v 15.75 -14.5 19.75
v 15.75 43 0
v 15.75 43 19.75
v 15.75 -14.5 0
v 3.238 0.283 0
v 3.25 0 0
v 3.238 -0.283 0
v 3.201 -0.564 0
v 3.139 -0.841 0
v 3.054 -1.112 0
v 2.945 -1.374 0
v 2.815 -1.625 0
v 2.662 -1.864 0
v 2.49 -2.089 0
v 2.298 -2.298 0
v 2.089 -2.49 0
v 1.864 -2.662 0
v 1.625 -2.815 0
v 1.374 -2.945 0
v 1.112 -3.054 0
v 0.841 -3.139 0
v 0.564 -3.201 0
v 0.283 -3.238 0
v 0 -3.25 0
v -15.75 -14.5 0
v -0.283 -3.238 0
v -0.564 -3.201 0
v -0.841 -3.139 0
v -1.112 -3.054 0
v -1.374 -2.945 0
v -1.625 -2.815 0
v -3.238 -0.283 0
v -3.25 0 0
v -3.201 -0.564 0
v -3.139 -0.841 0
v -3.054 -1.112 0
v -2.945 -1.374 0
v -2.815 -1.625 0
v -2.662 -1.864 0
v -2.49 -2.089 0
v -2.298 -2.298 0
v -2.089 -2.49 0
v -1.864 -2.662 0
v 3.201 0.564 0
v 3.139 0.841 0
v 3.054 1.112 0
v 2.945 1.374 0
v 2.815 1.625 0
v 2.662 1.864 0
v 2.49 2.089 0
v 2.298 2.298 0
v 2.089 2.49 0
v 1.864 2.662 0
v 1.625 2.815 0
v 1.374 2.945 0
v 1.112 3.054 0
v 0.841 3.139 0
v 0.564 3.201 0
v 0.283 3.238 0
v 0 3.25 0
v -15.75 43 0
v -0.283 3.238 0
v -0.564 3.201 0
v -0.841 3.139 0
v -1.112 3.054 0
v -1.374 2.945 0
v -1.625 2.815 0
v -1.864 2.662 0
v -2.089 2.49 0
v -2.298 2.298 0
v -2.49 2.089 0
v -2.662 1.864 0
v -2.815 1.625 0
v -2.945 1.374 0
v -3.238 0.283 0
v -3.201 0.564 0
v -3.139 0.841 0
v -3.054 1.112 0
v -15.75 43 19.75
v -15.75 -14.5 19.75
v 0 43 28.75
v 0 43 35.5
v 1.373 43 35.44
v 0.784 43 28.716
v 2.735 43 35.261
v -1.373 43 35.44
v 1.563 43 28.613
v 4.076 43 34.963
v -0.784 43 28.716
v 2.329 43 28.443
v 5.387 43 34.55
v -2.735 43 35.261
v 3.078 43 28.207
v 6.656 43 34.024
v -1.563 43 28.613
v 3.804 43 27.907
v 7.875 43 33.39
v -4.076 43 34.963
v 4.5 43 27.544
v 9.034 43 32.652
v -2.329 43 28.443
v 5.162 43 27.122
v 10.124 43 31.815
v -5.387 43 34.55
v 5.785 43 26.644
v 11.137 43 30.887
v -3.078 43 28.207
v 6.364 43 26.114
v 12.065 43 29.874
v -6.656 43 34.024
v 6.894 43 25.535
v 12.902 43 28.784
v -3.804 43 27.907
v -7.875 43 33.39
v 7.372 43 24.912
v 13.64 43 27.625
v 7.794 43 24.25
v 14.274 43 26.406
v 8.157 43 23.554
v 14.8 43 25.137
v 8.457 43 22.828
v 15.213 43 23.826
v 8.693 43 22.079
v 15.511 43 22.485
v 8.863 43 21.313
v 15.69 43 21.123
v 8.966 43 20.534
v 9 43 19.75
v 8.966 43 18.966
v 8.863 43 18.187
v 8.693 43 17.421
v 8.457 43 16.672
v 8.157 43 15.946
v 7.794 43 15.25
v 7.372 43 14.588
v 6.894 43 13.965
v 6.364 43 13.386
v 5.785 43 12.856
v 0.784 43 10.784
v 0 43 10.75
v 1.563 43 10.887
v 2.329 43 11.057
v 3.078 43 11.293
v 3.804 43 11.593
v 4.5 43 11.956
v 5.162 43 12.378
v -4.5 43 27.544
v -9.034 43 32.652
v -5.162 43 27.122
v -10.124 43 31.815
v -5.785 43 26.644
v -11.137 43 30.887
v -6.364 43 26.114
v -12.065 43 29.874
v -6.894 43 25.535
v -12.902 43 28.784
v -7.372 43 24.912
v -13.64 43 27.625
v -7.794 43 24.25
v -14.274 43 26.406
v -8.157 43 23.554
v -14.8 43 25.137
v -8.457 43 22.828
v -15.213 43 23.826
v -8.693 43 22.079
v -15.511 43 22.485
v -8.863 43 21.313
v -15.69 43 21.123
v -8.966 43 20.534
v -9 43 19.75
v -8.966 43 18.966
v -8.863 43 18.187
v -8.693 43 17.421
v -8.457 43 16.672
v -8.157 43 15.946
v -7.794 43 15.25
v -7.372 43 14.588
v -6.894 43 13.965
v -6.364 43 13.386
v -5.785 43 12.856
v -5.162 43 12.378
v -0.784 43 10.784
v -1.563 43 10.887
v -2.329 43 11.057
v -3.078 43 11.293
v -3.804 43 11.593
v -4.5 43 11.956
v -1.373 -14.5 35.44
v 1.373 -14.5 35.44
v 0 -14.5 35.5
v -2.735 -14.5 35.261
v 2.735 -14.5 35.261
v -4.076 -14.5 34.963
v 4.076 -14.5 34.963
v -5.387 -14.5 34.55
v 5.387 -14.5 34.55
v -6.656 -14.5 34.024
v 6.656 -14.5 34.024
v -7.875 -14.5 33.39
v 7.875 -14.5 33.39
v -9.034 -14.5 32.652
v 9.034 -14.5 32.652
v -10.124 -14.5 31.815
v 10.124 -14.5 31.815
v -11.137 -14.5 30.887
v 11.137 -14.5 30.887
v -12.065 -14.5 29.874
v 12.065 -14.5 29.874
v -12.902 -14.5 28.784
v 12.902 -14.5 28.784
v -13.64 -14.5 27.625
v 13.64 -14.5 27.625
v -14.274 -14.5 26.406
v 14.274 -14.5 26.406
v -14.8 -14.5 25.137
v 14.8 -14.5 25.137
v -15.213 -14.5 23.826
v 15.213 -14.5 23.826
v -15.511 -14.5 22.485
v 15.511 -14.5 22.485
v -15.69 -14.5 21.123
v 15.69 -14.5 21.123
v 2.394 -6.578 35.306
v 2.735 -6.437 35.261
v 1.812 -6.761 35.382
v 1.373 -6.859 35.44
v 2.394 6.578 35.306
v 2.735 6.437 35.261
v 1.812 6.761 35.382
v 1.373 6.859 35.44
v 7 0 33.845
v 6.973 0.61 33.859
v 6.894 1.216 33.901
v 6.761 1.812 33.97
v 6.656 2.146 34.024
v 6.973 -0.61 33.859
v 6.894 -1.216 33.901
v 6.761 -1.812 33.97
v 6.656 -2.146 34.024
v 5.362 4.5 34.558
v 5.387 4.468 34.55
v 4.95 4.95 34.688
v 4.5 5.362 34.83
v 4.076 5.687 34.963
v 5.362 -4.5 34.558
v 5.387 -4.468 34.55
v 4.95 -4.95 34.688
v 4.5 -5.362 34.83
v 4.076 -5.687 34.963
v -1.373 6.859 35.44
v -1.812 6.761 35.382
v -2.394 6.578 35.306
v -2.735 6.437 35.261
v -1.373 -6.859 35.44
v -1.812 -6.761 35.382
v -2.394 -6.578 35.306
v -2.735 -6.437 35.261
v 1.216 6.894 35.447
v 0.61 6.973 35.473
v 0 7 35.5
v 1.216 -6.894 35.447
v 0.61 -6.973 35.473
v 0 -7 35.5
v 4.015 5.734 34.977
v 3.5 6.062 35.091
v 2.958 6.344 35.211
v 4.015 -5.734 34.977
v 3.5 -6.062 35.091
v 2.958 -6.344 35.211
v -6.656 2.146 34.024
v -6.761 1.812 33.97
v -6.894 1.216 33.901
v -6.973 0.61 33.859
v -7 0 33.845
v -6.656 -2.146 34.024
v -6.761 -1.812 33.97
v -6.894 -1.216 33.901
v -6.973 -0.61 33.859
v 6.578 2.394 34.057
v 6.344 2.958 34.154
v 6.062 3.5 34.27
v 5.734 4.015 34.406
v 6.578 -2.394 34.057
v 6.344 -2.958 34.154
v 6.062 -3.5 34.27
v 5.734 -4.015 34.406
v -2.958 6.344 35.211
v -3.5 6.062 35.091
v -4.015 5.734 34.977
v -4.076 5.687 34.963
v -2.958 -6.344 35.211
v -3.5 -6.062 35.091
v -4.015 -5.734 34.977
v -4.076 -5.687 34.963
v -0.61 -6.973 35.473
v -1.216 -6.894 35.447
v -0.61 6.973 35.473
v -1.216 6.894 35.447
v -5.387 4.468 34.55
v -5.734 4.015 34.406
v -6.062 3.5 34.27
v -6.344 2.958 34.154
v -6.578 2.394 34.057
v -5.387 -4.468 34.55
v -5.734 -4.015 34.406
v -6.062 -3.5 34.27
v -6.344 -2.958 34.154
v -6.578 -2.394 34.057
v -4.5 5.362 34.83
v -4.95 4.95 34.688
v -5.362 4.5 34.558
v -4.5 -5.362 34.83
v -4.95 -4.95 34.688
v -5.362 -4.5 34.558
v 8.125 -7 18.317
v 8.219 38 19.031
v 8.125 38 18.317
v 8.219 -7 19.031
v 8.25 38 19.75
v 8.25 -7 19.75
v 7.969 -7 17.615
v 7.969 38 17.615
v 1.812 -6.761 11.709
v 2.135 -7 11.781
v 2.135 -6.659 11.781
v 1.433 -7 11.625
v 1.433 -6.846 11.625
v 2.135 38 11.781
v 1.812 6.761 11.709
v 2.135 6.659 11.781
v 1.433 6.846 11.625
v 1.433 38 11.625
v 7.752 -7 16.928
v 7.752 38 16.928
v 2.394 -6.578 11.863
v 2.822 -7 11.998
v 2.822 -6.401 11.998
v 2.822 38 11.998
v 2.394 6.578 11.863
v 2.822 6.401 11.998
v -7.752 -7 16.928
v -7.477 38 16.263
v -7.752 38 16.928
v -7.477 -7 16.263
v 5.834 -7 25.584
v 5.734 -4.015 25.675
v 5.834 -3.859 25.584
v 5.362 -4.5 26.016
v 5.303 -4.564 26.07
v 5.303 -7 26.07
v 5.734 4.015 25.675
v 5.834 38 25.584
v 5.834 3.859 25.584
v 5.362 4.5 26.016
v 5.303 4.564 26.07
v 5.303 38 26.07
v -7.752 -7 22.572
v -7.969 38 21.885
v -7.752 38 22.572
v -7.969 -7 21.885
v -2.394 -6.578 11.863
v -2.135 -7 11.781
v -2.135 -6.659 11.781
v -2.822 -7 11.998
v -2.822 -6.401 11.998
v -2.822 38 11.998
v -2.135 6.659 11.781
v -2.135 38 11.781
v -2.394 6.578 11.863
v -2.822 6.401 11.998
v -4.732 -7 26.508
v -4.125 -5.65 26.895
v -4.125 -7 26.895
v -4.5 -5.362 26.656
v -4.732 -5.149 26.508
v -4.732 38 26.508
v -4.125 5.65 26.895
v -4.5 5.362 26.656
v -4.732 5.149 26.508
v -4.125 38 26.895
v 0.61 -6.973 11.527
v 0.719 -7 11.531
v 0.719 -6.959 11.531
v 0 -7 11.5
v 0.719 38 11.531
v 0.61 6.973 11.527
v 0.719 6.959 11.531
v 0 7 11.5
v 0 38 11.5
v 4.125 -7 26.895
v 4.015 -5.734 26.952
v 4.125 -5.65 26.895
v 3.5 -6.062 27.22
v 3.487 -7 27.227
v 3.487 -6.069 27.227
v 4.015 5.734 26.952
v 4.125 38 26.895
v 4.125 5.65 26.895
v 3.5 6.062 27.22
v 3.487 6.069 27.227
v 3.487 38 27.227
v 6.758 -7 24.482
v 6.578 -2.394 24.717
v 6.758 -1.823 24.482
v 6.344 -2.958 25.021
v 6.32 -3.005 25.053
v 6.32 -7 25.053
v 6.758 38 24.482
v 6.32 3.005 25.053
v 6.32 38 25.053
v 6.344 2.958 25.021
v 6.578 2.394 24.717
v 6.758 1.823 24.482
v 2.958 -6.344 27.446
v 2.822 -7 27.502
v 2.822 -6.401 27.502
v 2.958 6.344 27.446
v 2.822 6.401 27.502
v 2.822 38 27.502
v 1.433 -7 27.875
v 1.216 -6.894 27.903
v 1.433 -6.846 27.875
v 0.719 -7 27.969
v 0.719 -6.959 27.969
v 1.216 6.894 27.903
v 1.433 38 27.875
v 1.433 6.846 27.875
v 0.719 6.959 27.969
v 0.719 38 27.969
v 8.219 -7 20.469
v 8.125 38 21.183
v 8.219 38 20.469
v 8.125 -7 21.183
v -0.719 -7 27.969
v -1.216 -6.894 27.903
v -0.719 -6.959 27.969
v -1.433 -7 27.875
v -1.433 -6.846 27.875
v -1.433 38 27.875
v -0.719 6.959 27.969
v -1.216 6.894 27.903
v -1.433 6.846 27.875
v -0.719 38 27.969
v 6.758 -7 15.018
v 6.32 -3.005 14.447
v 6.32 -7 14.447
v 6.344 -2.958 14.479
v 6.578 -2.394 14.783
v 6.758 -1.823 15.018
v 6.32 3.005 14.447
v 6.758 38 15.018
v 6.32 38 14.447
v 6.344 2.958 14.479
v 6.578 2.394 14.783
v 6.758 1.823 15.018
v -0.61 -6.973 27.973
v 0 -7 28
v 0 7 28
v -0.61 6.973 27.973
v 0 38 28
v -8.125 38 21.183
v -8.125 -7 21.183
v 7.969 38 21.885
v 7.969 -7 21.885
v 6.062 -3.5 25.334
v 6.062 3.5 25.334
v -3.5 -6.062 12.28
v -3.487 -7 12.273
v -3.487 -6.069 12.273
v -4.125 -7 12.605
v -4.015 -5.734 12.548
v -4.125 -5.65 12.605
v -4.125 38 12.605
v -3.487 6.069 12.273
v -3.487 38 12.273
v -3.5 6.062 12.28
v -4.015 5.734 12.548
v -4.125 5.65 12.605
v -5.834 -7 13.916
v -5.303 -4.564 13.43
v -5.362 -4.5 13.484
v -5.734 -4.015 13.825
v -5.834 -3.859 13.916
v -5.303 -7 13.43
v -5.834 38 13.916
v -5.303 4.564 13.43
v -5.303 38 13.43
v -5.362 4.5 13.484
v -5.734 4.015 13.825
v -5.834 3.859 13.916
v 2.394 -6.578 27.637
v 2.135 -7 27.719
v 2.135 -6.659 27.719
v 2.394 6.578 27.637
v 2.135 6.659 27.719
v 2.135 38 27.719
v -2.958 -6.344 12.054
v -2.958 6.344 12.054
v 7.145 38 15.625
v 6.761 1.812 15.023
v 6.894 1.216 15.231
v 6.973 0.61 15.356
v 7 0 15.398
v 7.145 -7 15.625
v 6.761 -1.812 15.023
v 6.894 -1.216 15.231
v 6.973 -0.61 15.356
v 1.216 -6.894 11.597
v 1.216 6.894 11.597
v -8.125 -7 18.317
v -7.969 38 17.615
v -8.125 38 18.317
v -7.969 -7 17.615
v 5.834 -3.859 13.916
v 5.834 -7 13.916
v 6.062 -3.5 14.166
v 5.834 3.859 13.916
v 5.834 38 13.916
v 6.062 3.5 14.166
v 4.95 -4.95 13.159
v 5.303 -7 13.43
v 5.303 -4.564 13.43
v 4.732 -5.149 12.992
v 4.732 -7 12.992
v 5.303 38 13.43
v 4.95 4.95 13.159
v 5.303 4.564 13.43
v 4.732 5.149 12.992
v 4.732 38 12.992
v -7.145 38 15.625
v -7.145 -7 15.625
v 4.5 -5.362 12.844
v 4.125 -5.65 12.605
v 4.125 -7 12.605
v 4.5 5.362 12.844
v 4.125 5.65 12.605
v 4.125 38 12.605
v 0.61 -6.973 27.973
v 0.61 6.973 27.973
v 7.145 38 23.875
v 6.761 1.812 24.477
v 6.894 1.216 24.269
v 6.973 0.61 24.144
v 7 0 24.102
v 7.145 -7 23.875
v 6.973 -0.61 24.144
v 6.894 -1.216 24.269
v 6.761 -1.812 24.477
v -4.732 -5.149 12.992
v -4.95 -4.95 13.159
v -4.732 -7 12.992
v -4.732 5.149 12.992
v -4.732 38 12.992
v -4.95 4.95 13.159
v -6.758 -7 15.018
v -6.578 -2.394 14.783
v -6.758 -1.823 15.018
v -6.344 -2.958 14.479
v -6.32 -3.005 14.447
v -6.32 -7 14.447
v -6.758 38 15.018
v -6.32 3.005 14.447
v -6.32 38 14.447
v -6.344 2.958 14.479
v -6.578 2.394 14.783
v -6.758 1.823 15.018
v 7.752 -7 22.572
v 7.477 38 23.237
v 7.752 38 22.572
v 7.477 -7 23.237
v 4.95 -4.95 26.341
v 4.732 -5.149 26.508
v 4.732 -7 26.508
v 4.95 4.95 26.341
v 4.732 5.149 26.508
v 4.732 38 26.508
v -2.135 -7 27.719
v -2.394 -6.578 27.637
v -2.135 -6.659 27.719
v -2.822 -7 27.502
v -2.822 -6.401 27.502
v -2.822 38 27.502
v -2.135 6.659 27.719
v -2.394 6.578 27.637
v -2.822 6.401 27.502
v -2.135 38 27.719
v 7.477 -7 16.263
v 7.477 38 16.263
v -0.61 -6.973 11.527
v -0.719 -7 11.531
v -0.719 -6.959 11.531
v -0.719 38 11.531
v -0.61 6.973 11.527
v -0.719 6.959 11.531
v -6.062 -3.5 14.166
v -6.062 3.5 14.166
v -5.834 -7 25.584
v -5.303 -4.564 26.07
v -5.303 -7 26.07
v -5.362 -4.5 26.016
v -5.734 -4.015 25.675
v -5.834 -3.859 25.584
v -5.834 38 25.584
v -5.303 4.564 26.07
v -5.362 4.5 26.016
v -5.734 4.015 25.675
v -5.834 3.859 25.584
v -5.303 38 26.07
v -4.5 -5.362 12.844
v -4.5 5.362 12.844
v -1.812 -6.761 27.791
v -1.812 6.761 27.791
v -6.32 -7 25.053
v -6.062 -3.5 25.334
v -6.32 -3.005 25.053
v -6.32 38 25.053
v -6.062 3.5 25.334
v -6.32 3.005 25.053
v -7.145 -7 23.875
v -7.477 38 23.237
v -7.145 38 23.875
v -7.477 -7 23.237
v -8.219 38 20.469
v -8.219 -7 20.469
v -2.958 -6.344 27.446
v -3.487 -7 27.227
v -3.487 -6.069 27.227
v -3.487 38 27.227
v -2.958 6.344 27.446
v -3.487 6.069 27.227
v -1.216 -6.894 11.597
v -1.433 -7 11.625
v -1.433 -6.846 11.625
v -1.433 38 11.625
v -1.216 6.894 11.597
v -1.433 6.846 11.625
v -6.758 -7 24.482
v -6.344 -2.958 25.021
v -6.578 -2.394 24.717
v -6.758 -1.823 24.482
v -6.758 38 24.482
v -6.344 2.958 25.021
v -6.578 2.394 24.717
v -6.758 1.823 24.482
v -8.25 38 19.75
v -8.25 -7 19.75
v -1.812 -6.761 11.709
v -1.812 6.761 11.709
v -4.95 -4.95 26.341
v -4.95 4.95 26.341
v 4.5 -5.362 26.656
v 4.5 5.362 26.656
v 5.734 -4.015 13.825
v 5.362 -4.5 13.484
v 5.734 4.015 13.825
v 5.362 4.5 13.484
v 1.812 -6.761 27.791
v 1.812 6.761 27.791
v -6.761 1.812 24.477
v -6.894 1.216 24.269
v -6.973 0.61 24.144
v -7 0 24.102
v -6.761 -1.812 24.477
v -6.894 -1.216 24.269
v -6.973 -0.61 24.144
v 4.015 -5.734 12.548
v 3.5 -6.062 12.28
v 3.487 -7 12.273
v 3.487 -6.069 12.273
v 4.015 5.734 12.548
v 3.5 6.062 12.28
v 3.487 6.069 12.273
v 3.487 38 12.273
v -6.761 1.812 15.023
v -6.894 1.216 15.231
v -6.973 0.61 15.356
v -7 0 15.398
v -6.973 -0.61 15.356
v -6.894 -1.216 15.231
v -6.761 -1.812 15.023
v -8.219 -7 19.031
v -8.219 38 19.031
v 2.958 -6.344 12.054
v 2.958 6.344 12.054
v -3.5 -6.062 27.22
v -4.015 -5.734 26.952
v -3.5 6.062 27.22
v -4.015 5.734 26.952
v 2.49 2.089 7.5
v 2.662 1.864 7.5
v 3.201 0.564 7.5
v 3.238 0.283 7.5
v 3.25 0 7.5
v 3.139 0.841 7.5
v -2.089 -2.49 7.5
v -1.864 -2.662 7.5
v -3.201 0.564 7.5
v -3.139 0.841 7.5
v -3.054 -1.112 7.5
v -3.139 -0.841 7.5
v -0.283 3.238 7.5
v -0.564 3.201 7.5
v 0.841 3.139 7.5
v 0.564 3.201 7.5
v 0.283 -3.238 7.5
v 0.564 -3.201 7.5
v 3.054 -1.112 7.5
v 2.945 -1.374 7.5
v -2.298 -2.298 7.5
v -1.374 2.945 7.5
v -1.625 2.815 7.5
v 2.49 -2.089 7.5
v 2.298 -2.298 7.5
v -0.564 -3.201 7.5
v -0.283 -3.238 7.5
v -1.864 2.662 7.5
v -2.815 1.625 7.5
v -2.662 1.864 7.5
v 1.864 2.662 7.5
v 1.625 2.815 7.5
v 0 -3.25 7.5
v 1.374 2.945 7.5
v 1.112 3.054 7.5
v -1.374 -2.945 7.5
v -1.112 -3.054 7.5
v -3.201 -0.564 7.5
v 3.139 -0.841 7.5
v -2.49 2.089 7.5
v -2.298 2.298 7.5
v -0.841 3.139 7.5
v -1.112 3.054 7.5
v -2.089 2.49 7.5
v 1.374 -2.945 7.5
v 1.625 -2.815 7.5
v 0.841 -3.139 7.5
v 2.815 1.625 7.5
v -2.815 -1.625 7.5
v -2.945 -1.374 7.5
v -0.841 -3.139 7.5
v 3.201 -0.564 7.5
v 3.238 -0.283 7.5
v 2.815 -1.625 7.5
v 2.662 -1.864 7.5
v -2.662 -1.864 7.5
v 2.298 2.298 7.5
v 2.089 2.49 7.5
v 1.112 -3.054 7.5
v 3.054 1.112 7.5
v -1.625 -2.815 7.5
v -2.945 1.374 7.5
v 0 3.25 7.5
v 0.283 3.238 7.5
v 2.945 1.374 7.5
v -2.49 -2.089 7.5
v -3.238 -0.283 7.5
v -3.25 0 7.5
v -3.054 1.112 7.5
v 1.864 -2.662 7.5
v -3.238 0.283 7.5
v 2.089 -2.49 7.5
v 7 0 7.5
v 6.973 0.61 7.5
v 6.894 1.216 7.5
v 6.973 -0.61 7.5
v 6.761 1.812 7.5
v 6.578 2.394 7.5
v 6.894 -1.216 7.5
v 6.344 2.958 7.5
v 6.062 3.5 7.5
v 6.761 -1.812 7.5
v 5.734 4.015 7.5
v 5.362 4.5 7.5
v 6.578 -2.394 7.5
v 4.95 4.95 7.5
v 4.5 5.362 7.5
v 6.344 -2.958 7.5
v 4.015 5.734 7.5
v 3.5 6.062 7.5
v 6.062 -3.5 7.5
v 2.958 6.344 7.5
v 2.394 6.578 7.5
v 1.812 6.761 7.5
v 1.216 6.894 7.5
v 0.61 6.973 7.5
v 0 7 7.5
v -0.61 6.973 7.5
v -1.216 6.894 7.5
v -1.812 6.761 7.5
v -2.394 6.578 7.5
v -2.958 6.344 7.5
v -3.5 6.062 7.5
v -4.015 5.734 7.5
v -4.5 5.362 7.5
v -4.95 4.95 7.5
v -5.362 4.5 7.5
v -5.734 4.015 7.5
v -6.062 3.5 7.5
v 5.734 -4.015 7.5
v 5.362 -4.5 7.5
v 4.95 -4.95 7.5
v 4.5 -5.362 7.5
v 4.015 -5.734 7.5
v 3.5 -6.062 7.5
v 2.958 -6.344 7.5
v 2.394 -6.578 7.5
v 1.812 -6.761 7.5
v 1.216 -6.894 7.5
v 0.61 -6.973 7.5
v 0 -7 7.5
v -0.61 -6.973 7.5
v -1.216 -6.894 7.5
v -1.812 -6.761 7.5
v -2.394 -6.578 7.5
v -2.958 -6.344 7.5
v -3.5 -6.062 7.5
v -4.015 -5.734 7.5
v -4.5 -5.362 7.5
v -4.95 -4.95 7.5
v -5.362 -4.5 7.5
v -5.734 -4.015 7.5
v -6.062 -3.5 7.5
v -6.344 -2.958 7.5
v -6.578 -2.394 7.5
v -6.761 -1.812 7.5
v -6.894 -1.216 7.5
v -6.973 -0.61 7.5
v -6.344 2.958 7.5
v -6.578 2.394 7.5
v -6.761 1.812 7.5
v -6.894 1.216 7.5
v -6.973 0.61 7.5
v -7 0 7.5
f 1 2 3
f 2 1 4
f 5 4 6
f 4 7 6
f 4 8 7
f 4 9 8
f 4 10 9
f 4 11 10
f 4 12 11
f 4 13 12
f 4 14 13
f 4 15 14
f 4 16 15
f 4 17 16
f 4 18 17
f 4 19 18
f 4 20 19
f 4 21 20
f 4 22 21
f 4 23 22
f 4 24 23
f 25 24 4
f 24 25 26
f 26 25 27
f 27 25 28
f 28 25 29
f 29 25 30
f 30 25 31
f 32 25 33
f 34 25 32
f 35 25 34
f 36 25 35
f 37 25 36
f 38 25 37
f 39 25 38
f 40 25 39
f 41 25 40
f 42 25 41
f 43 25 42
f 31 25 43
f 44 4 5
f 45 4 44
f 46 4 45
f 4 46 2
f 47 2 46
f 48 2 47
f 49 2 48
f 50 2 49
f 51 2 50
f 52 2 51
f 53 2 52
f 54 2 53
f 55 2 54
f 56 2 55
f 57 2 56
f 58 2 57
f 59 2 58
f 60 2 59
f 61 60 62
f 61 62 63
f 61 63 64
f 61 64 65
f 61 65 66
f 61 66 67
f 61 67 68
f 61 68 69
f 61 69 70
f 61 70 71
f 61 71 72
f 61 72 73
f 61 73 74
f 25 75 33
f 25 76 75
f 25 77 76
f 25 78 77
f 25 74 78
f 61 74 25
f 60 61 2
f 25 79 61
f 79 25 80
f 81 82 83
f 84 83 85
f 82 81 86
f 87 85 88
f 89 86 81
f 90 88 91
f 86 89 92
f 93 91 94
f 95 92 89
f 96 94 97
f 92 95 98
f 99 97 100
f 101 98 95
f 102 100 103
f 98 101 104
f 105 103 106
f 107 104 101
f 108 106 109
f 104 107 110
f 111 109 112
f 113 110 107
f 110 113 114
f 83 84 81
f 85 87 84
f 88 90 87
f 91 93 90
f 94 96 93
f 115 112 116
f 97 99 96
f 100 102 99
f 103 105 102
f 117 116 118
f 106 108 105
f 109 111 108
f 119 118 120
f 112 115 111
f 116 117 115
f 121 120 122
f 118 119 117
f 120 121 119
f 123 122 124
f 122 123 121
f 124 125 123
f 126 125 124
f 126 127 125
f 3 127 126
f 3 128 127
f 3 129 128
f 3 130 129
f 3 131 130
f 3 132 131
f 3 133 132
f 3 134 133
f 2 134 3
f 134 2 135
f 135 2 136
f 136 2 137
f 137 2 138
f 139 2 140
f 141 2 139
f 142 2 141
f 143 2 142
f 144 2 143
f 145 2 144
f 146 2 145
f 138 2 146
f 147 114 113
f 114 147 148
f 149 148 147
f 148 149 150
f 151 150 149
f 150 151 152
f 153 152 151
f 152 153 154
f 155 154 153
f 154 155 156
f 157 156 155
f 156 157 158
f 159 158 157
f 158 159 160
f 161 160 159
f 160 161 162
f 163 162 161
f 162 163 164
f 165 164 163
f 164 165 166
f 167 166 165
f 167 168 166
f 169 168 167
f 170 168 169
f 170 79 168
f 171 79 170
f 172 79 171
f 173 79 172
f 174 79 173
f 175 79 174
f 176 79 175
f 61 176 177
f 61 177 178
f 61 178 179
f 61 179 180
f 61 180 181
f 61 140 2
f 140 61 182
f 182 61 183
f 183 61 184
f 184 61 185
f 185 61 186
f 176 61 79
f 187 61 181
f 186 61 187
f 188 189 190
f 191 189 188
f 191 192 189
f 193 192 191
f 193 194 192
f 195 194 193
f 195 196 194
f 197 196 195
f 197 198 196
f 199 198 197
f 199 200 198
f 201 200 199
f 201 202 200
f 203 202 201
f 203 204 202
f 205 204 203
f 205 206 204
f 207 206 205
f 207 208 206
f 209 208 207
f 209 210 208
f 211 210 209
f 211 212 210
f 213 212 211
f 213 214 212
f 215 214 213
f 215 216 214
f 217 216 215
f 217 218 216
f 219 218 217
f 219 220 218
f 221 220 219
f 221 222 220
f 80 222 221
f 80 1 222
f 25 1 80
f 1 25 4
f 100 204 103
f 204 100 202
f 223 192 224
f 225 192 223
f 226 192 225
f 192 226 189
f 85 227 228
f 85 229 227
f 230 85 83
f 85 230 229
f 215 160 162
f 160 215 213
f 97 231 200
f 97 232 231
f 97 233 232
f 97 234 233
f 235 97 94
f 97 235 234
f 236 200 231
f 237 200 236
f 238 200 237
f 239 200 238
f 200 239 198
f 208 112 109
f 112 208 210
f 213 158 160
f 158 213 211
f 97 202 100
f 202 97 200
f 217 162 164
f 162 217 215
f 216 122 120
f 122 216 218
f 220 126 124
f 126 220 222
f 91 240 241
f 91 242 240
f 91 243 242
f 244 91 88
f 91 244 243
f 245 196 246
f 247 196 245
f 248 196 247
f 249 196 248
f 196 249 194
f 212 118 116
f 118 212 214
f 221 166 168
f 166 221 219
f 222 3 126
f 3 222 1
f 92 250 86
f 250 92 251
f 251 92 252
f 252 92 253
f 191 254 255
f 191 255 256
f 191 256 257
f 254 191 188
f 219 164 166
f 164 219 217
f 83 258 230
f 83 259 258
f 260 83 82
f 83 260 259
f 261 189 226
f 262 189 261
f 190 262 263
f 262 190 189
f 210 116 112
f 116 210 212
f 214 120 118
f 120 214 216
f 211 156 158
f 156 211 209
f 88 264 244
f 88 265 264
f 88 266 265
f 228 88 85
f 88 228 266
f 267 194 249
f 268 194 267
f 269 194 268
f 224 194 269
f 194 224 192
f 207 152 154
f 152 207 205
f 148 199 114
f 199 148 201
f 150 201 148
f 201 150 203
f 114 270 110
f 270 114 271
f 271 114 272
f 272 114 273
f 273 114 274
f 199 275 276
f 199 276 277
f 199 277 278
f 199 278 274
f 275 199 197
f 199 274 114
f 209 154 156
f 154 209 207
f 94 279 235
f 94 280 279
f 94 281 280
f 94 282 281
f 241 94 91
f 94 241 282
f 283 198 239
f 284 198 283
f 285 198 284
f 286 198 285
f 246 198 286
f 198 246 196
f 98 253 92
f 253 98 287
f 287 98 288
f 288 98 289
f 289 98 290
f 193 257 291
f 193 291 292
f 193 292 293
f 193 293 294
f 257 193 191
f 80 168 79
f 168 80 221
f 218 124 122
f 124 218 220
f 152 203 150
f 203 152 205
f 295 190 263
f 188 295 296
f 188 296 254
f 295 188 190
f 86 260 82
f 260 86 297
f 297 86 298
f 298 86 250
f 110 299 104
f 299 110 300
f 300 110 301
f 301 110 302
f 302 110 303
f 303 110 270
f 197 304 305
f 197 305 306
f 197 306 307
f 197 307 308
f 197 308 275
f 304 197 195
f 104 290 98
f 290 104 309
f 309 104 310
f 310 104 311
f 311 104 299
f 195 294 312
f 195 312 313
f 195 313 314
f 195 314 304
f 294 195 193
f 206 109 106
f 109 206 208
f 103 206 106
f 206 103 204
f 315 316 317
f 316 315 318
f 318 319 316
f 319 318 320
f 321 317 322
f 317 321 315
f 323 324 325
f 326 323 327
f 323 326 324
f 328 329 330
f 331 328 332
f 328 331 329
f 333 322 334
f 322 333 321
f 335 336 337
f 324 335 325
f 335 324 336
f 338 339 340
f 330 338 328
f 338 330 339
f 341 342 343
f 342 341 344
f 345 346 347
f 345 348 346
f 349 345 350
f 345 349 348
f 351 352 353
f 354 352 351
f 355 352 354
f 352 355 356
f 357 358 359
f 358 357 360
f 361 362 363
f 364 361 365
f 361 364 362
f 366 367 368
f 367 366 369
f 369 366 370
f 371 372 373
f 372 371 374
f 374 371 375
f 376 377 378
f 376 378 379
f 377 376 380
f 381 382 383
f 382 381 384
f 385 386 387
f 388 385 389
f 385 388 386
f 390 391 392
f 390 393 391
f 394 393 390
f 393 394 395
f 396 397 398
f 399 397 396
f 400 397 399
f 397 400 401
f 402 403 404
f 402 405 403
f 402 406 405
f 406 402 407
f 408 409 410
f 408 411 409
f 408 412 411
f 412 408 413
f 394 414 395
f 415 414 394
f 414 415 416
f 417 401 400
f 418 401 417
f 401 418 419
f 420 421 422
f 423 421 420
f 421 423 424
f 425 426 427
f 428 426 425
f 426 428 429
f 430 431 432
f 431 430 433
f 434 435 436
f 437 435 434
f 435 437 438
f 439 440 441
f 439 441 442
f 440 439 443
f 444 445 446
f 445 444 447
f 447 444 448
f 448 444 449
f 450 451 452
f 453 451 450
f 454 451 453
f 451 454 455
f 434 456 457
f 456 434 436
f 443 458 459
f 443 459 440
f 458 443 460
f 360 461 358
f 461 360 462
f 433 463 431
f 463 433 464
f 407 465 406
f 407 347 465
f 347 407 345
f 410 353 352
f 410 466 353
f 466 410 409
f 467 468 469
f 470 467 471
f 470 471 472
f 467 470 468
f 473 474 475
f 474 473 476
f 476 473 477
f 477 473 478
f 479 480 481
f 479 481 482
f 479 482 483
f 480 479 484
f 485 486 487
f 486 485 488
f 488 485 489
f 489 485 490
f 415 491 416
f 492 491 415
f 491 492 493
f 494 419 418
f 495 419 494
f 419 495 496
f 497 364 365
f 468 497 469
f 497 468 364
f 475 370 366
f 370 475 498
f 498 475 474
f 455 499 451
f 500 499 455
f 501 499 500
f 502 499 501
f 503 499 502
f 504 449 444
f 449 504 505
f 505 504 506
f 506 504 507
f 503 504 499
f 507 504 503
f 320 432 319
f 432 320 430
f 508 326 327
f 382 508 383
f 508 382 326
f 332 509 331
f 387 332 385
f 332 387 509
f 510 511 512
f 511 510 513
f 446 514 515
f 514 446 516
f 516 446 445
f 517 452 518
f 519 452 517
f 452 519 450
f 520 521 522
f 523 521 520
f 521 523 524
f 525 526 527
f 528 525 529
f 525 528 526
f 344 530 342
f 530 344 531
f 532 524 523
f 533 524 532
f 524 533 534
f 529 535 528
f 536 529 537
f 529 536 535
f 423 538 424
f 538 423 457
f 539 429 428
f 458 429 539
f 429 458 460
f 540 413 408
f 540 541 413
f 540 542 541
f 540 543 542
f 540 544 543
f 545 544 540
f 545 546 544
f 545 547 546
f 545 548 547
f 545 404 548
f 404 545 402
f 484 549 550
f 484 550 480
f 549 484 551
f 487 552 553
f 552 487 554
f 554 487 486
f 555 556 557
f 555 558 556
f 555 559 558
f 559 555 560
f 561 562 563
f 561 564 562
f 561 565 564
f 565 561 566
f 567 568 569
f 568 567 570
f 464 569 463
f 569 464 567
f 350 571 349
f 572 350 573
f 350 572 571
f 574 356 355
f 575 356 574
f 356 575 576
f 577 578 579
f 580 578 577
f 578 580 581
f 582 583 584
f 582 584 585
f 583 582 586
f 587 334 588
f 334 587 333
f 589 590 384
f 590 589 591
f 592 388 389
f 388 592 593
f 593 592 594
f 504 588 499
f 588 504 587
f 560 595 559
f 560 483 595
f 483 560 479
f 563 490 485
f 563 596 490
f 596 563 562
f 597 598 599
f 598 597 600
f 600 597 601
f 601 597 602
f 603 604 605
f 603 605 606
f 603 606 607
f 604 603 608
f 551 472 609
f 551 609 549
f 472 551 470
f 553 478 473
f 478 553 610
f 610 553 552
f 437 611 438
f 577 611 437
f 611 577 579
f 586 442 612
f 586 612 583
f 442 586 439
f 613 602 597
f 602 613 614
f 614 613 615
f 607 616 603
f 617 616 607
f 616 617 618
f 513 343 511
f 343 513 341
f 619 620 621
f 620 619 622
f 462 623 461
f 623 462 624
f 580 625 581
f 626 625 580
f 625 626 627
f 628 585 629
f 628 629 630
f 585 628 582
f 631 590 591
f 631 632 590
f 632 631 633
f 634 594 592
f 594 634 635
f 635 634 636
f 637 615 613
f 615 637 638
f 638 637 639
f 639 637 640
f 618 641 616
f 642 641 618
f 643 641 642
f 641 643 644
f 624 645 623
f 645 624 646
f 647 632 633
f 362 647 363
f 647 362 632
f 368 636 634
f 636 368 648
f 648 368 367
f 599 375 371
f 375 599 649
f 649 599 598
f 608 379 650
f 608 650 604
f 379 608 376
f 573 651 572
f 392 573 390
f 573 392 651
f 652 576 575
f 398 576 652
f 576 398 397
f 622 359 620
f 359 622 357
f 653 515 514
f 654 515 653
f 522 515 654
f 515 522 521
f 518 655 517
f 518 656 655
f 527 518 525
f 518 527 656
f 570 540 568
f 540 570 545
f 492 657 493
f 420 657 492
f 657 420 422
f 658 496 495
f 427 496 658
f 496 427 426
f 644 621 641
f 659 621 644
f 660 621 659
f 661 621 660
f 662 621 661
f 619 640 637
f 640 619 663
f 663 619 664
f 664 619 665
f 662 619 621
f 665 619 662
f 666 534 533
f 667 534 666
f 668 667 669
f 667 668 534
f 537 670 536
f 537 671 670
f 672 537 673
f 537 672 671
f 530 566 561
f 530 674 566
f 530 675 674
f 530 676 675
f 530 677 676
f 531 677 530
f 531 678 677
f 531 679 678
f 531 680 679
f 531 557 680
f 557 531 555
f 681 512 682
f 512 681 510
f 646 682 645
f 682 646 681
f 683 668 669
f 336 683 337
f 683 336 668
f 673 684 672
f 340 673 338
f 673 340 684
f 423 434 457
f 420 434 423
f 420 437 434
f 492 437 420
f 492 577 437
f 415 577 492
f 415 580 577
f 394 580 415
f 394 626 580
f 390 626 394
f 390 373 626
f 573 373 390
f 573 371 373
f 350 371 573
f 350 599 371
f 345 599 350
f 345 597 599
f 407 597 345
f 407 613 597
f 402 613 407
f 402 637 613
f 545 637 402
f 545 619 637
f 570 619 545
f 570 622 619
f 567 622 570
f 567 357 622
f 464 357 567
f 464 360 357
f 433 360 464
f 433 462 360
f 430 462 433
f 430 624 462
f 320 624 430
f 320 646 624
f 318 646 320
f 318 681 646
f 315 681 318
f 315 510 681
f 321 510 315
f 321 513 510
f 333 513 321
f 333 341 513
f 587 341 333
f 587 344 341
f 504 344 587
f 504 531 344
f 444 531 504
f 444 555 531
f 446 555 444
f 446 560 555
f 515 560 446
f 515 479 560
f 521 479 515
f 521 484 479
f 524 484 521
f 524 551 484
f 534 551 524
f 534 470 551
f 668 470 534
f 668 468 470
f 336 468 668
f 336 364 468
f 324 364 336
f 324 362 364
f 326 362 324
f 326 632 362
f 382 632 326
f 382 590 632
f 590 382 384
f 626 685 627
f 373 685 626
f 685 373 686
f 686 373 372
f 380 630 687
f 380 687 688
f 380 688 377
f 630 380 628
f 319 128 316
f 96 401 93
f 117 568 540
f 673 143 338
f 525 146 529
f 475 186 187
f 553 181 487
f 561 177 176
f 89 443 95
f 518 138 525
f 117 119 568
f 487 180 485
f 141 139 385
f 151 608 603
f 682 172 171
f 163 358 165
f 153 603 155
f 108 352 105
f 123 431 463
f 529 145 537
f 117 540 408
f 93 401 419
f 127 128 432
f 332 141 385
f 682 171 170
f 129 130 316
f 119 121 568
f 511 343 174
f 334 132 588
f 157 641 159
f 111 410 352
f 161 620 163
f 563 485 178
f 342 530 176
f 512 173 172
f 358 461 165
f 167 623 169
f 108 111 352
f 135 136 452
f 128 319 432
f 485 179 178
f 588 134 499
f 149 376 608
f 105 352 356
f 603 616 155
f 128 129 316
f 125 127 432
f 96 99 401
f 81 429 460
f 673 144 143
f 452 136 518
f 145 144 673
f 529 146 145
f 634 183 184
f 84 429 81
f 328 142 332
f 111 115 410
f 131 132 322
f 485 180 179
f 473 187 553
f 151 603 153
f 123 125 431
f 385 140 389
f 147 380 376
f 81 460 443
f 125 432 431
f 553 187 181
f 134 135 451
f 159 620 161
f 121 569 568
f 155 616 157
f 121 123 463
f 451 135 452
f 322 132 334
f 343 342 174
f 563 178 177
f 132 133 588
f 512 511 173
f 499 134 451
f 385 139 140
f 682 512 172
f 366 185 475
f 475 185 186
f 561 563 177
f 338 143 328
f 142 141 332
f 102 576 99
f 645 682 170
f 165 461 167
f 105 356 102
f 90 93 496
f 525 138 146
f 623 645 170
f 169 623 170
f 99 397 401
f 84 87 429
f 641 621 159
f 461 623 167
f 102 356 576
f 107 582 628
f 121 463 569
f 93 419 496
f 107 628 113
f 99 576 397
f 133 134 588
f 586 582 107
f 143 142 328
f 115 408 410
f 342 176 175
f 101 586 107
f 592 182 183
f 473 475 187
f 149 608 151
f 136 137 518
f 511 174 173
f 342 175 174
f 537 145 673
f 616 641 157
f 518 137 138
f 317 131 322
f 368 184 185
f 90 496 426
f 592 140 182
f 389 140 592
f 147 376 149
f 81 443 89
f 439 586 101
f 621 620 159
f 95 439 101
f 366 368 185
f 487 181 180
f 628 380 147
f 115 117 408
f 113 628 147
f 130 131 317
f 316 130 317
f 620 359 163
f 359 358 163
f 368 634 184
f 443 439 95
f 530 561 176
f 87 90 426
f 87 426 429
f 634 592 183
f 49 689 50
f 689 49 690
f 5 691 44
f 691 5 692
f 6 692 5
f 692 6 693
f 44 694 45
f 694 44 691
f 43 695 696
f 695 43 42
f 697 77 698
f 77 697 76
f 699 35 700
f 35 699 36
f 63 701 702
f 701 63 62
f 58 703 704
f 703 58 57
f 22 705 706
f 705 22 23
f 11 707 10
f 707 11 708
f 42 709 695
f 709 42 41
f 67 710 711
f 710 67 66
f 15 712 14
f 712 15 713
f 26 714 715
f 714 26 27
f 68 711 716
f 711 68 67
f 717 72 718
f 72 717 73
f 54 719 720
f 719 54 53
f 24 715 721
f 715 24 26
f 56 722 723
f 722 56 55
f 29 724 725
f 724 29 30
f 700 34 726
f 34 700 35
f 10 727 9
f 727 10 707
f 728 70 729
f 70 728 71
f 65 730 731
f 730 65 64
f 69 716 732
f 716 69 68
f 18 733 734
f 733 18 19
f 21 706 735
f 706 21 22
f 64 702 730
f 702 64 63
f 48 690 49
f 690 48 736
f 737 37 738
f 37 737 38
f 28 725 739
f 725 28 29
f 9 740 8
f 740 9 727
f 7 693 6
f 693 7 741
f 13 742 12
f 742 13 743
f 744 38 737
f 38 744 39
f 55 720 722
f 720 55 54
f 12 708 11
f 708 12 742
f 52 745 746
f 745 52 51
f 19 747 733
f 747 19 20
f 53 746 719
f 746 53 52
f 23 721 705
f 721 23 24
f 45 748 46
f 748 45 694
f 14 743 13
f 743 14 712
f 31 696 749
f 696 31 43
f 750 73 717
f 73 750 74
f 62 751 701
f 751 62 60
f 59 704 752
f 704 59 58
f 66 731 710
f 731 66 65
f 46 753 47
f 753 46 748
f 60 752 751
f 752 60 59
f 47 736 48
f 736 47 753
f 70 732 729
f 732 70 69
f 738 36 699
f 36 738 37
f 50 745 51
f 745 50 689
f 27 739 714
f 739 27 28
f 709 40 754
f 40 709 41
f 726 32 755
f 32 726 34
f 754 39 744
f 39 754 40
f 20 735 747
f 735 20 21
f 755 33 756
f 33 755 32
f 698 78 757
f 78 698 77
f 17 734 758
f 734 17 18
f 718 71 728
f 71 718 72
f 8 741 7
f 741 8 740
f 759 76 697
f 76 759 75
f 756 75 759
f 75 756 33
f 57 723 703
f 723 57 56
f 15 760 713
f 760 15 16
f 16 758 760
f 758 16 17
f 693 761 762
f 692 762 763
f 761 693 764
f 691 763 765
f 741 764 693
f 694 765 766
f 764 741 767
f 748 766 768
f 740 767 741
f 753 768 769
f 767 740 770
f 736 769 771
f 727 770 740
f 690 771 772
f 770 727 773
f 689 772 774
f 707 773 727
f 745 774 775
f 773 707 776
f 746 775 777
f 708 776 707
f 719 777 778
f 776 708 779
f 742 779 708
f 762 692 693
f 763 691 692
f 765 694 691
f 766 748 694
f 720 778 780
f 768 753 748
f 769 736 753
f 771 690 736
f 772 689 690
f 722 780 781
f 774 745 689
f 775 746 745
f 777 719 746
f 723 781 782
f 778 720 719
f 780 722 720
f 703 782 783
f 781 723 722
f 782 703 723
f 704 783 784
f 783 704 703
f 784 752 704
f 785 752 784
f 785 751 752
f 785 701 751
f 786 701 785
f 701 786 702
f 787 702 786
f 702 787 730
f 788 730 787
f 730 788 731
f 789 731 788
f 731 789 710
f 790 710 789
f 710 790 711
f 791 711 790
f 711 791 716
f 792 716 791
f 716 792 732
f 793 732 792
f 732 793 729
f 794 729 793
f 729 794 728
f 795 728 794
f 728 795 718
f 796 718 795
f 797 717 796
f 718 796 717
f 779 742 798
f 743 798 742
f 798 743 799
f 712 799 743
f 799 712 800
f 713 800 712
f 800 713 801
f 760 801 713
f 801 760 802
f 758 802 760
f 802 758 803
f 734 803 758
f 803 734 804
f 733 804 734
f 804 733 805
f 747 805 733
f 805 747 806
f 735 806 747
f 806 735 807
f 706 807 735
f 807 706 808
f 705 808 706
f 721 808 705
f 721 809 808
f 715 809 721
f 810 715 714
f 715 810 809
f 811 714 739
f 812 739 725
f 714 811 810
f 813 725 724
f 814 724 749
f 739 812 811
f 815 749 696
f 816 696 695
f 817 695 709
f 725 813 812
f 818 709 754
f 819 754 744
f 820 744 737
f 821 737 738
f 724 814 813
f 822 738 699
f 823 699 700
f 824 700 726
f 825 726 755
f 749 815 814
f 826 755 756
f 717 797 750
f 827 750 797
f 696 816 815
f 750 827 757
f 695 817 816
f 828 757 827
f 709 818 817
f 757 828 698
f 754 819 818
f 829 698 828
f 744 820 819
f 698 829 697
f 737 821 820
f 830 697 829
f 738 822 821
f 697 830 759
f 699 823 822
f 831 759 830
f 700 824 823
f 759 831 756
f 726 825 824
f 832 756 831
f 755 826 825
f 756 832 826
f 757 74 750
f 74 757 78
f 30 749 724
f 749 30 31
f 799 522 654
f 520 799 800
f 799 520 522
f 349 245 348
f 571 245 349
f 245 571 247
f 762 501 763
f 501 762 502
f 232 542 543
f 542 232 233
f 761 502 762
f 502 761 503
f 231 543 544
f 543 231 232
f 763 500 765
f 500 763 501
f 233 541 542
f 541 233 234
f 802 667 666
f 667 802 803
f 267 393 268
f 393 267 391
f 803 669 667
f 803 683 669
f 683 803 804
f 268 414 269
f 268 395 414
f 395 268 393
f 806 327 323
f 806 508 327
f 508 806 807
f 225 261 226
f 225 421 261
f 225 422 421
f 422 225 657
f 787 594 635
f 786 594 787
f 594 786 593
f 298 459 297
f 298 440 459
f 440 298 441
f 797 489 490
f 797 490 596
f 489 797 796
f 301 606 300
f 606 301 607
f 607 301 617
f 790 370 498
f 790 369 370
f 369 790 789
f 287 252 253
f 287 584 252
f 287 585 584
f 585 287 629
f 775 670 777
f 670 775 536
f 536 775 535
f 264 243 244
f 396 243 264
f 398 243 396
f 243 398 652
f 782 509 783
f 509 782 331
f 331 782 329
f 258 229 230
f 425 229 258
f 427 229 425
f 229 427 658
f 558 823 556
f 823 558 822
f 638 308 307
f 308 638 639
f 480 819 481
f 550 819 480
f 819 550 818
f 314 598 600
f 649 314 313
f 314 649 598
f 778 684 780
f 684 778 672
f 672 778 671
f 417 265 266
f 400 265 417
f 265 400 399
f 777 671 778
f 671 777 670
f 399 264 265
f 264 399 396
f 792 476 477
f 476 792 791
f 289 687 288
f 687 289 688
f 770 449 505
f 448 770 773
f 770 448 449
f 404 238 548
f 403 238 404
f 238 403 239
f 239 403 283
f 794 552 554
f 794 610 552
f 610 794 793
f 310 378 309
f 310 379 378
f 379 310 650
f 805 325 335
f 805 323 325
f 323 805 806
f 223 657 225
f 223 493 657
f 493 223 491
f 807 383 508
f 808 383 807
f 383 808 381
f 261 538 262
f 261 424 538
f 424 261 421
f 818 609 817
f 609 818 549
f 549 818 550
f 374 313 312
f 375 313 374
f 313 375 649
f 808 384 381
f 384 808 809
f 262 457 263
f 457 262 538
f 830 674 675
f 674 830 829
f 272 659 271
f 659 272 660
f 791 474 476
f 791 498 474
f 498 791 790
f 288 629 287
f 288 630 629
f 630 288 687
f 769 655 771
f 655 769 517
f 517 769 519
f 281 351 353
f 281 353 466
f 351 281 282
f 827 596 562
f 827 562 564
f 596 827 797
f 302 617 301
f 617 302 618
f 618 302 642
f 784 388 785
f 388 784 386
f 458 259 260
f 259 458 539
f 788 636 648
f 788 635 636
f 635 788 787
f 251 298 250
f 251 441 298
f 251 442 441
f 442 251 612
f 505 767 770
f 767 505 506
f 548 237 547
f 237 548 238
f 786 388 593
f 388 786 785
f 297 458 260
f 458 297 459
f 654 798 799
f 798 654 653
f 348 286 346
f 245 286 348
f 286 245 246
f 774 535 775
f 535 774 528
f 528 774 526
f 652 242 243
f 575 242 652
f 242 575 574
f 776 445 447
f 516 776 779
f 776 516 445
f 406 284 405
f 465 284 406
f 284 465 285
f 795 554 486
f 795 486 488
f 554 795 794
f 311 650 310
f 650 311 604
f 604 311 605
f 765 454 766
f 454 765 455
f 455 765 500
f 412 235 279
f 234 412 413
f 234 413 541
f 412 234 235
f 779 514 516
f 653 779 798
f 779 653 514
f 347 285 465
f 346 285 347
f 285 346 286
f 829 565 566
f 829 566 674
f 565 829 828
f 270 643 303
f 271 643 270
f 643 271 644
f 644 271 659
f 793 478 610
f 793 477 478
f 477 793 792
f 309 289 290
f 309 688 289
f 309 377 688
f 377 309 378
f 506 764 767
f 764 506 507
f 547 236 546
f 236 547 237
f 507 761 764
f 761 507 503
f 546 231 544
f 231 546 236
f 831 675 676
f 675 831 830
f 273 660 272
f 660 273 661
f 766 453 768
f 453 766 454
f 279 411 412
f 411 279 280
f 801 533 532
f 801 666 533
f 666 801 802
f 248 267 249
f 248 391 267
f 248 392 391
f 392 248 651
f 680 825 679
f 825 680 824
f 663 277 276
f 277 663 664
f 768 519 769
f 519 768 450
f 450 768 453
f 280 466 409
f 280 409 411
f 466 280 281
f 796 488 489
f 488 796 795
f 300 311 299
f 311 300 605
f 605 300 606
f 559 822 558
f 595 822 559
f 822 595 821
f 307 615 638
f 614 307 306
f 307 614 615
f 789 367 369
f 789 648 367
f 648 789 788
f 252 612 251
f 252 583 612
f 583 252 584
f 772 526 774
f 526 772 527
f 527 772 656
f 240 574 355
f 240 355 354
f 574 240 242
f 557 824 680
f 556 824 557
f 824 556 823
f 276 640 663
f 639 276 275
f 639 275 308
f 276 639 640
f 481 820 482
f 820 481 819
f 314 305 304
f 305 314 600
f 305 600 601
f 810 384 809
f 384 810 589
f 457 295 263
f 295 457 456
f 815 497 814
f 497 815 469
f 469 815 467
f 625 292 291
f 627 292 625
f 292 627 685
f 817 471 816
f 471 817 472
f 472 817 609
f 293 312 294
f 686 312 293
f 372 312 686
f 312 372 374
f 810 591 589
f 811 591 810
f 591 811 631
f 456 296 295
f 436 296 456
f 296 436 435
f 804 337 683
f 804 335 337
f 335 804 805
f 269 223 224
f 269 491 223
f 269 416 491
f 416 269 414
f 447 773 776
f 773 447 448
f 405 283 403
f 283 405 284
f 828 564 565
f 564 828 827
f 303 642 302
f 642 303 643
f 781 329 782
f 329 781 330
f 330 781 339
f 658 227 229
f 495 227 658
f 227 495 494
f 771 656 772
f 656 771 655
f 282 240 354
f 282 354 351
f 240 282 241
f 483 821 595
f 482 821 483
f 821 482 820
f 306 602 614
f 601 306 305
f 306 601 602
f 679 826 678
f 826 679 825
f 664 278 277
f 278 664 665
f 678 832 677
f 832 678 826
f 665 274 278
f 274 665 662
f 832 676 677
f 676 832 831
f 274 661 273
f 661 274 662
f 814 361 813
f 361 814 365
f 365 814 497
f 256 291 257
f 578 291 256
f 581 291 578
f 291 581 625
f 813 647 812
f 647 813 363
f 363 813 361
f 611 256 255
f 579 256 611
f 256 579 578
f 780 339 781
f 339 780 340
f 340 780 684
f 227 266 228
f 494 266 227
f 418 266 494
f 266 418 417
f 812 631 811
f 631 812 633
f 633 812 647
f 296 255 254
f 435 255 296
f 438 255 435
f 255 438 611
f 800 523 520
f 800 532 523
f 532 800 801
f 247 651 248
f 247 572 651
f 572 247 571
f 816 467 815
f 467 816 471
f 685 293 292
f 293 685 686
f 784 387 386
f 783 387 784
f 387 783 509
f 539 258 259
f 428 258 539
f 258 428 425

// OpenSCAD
// file: measurements.scad
// The thickness of any walls (e.g. the difference between the inner and outer radiuses of a tube retainer).
thickness_mm = 7.5;

// The tube which spaces apart the VESA mount and the Kinect mount.
////////////////////////////////////////////////////////////////////////////////

// The diameter of the narrowest part of the tube's retainer.
tube_retainer_diameter_mm = 16.5;

// The total length of the tube's retainer.
tube_retainer_length_mm = 50;

// The diameter of the widest part of the tube's retainer.
tube_feed_diameter_mm = 18;

// The length of the transition between the widest and narrowest parts of the
// tube's retainer.
tube_feed_length_mm = 5;

// The number of sides on the tube's retainer.
tube_sides = 72;

// Additional radius added where a tube mounting meets a surface.
tube_widening_mm = 10;

// Kinect for Xbox 360.
////////////////////////////////////////////////////////////////////////////////

// The length of the Kinect's base.
kinect_length_mm = 75;

// The width of the bottom of the Kinect's base.
kinect_lower_width_mm = 81;

// The thickness of the base below the Kinect.
kinect_base_height_mm = 2;

// The width of the middle of the Kinect's base (its widest point).
kinect_middle_width_mm = 88.5;

// The distance between the bottom of the Kinect's base and its widest point.
kinect_lower_height_mm = 13;

// The width of the top of the Kinect's base.
kinect_top_width_mm = 80;

// The distance between the widest point of the Kinect's base and the top of the
// retainer.
kinect_upper_height_mm = 5;

// The thickness of the Kinect's retainer.
kinect_clip_thickness_mm = 2;

// The diameter of the head of the M3 screw used to secure the Kinect.
kinect_screw_head_diameter_mm = 7;

// The diameter of the hole required by the M3 screw used to secure the Kinect.
kinect_screw_hole_diameter_mm = 2.95;

// The number of sides of the head of or the hole required by the M3 screw used
// to secure the Kinect.
kinect_screw_sides = 24;

// The height of the internal bridges used to support screw holes.
kinect_screw_hole_bridge_height_mm = 0.75;

// The distance between the Kinect's front and back screw holes.
kinect_screw_y_spacing_mm = 19.25;

// The distance between the Kinect's left and right screw holes.
kinect_screw_x_spacing_mm = 68.5;

// The space which must be clear behind a Kinect for cable routing.
kinect_cable_spacing_mm = 15;

// The VESA mounting.
////////////////////////////////////////////////////////////////////////////////

// The diameter of the VESA mounting M6 screw's head.
vesa_screw_head_diameter_mm = 14;

// The diameter of the VESA mounting M6 screw's hole.
vesa_screw_hole_diameter_mm = 6.5;

// The number of sides of the VESA mounting M6 screw.
vesa_screw_sides = 72;

// The height of the VESA mounting M6 screw's head.
vesa_screw_height_height_mm = 4;

// The MALM push-fit bracket.
////////////////////////////////////////////////////////////////////////////////

// The thickness of the desk.
malm_height_mm = 50.5;

// The length of the fingers which push onto the desk.  Increase to improve
// pitch stability.
malm_length_mm = 70;

// The width of the fingers which push onto the desk.  Increase to improve roll
// stability.
malm_width_mm = 60;
// main file
include <measurements.scad>;

width_mm = max(vesa_screw_head_diameter_mm, tube_retainer_diameter_mm) + thickness_mm * 2;

difference() {
  union() {
    translate([
      width_mm / -2,
      vesa_screw_head_diameter_mm / -2 - thickness_mm,
      0,
    ]) {
      cube([
        width_mm,
        thickness_mm + tube_retainer_length_mm,
        thickness_mm + vesa_screw_height_height_mm + tube_retainer_diameter_mm / 2,
      ]);
    };

    translate([
      0,
      vesa_screw_head_diameter_mm / -2 - thickness_mm,
      thickness_mm + vesa_screw_height_height_mm + tube_retainer_diameter_mm / 2,
    ]) {
      rotate([-90, 0, 0]) {
        cylinder(
          d = tube_retainer_diameter_mm + thickness_mm * 2,
          h = thickness_mm + tube_retainer_length_mm,
          $fn = tube_sides
        );
      };
    };
  };

  translate([
    0,
    vesa_screw_head_diameter_mm / -2,
    thickness_mm + vesa_screw_height_height_mm + tube_retainer_diameter_mm / 2,
  ]) {
    rotate([-90, 0, 0]) {
      cylinder(
        d = tube_retainer_diameter_mm,
        h = tube_retainer_length_mm,
        $fn = tube_sides
      );
    };
  };

  translate([
    0,
    vesa_screw_head_diameter_mm / -2 + tube_retainer_length_mm - tube_feed_length_mm,
    thickness_mm + vesa_screw_height_height_mm + tube_retainer_diameter_mm / 2,
  ]) {
    rotate([-90, 0, 0]) {
      cylinder(
        d1 = tube_retainer_diameter_mm,
        d2 = tube_feed_diameter_mm,
        h = tube_feed_length_mm,
        $fn = tube_sides
      );
    };
  };

  cylinder(
    d = vesa_screw_hole_diameter_mm,
    h = thickness_mm,
    $fn = vesa_screw_sides
  );

  translate([0, 0, thickness_mm]) {
    cylinder(
      d = vesa_screw_head_diameter_mm,
      h = vesa_screw_height_height_mm + tube_retainer_diameter_mm + thickness_mm,
      $fn = vesa_screw_sides
    );
  };
};
